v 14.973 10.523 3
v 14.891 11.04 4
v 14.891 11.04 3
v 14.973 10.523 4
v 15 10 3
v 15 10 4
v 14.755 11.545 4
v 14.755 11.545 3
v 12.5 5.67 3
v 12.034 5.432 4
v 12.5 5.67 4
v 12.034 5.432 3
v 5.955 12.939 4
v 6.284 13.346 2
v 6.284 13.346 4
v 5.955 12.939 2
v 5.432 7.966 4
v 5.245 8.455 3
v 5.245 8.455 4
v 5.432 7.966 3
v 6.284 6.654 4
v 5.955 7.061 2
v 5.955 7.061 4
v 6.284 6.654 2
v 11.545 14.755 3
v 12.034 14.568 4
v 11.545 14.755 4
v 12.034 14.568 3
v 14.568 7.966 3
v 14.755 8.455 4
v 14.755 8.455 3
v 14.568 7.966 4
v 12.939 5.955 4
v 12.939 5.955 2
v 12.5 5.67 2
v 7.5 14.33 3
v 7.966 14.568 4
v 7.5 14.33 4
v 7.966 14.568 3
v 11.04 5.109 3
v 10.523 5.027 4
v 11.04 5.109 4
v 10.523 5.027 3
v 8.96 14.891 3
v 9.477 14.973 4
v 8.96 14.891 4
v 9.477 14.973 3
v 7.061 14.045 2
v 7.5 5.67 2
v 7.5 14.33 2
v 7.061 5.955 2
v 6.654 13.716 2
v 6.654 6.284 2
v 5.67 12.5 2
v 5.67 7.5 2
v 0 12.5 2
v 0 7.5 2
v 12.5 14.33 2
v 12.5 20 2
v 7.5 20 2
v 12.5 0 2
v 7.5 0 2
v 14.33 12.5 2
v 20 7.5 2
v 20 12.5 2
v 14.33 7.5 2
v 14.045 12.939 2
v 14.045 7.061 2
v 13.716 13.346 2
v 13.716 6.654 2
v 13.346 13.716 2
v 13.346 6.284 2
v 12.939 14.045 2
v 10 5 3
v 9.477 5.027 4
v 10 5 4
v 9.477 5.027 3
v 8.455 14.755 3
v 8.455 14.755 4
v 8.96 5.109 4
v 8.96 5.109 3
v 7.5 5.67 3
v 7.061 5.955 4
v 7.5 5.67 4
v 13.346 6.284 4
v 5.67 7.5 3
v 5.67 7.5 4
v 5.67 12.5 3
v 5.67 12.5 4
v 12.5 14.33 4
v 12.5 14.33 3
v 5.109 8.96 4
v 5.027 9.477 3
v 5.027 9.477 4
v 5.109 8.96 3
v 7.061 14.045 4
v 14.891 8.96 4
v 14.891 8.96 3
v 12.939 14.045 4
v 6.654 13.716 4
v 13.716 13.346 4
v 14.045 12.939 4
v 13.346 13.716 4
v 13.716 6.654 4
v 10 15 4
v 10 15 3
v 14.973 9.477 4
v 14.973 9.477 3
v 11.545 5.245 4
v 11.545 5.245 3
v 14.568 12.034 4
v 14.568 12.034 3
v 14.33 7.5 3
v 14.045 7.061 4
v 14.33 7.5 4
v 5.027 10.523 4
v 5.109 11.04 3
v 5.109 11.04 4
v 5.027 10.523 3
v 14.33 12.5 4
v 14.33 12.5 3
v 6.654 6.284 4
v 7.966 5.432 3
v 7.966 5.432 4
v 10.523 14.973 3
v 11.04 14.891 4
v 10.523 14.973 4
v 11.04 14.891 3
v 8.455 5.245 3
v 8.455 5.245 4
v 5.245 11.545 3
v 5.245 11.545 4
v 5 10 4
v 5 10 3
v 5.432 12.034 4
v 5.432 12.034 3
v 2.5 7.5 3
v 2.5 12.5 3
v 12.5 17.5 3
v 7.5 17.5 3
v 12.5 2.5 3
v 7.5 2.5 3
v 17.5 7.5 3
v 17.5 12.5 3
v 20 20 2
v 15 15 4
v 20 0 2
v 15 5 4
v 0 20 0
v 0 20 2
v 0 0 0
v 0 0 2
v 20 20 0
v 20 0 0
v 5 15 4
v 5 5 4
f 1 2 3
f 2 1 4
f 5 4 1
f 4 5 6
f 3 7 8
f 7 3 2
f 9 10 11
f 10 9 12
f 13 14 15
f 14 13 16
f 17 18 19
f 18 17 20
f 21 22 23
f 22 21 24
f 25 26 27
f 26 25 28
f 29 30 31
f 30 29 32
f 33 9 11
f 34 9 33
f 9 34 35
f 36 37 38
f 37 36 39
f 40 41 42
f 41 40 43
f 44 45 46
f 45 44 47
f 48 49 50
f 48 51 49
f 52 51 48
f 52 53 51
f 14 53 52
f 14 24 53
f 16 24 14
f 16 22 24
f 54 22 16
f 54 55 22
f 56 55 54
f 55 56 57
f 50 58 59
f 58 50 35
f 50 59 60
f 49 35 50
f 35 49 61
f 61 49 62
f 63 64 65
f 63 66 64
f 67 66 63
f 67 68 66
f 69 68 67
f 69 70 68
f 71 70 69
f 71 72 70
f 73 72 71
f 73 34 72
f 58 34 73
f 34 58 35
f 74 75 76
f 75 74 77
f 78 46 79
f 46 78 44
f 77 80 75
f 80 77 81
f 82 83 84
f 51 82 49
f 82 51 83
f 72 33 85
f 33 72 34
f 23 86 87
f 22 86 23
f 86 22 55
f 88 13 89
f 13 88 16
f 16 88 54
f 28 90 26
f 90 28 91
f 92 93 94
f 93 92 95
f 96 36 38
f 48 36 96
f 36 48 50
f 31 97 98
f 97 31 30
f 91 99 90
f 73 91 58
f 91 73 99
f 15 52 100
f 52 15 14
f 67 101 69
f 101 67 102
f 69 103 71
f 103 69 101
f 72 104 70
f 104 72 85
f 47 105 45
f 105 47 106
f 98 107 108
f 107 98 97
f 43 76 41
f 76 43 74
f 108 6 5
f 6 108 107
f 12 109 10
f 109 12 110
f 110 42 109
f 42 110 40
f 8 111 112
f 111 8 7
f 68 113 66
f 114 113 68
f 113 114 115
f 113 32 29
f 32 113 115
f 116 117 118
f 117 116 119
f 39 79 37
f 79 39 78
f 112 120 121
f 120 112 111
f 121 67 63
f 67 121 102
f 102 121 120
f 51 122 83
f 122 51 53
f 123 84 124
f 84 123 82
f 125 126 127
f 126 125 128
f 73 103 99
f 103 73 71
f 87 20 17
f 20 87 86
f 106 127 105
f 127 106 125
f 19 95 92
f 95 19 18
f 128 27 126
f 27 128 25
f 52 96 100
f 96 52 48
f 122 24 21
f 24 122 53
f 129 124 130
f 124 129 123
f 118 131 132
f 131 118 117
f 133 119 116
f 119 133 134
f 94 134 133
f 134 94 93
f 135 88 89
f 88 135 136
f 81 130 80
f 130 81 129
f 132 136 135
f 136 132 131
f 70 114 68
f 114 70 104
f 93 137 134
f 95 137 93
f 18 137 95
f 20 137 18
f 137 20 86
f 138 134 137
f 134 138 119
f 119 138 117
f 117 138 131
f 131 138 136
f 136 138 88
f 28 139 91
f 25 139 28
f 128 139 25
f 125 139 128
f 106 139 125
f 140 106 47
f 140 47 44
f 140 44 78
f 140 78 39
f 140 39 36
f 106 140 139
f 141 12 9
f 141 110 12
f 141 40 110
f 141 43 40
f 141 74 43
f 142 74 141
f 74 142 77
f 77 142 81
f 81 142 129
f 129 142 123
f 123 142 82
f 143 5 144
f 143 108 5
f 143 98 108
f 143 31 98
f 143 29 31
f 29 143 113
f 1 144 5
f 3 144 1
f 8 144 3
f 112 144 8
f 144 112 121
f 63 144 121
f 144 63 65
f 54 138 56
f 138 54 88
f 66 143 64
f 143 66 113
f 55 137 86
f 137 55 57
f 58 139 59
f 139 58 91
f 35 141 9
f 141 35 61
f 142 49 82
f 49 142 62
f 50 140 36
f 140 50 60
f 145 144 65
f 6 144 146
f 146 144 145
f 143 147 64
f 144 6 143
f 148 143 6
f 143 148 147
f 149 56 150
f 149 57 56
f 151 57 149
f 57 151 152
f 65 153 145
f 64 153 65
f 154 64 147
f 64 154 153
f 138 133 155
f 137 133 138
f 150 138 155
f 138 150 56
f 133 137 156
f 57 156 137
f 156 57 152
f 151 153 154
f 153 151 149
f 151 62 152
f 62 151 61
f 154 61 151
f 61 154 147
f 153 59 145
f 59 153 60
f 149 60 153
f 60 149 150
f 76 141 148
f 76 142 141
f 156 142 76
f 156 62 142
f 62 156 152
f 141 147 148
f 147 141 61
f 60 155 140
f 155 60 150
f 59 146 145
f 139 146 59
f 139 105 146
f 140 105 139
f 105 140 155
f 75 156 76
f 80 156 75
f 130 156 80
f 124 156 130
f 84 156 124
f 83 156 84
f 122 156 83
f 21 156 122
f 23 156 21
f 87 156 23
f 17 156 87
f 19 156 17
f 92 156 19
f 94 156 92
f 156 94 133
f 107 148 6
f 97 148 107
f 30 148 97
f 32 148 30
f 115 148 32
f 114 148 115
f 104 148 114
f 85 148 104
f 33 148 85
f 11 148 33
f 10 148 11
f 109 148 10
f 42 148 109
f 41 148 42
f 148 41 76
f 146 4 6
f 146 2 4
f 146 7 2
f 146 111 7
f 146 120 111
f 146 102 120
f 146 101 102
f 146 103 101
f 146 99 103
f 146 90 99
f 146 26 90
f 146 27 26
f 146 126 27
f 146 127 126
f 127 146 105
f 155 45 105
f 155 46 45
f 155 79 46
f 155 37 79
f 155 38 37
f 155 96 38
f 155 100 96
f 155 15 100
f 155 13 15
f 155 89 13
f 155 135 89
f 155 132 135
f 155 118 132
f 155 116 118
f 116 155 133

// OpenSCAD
///< Zip tie pad

pad_w     = 20;
top_pad_h =  2;
pad_h     =  2;

zip_tie_pad( pad_w, top_pad_h, pad_h );

module zip_tie_pad( w, th, h){
     center = w/2-w/8;
     difference(){
	  tie_pad(w, h, th);
	  zip_anchor(w, h, center, th);
     }
}

module zip_anchor(w,h,c,th){
     upper_cube_w = w/4;

     color( rand_clr() )
	  union(){
	  translate([w/2,w/2,h])color( rand_clr() )
	       cylinder( r=upper_cube_w, h=(h+th), $fn=60);
	  translate([0,c,h])cube([w, upper_cube_w, th/2]);
	  translate([c,0,h])cube([upper_cube_w, w, th/2]);
     }
}

module tie_pad(w,h,th){
    hull(){
	cube([w, w, h]);
	translate([w/4,w/4,h])color( rand_clr() ) cube([w/2, w/2, th ]);
    }
}

function rand_clr() = rands( 0,1,3 );
